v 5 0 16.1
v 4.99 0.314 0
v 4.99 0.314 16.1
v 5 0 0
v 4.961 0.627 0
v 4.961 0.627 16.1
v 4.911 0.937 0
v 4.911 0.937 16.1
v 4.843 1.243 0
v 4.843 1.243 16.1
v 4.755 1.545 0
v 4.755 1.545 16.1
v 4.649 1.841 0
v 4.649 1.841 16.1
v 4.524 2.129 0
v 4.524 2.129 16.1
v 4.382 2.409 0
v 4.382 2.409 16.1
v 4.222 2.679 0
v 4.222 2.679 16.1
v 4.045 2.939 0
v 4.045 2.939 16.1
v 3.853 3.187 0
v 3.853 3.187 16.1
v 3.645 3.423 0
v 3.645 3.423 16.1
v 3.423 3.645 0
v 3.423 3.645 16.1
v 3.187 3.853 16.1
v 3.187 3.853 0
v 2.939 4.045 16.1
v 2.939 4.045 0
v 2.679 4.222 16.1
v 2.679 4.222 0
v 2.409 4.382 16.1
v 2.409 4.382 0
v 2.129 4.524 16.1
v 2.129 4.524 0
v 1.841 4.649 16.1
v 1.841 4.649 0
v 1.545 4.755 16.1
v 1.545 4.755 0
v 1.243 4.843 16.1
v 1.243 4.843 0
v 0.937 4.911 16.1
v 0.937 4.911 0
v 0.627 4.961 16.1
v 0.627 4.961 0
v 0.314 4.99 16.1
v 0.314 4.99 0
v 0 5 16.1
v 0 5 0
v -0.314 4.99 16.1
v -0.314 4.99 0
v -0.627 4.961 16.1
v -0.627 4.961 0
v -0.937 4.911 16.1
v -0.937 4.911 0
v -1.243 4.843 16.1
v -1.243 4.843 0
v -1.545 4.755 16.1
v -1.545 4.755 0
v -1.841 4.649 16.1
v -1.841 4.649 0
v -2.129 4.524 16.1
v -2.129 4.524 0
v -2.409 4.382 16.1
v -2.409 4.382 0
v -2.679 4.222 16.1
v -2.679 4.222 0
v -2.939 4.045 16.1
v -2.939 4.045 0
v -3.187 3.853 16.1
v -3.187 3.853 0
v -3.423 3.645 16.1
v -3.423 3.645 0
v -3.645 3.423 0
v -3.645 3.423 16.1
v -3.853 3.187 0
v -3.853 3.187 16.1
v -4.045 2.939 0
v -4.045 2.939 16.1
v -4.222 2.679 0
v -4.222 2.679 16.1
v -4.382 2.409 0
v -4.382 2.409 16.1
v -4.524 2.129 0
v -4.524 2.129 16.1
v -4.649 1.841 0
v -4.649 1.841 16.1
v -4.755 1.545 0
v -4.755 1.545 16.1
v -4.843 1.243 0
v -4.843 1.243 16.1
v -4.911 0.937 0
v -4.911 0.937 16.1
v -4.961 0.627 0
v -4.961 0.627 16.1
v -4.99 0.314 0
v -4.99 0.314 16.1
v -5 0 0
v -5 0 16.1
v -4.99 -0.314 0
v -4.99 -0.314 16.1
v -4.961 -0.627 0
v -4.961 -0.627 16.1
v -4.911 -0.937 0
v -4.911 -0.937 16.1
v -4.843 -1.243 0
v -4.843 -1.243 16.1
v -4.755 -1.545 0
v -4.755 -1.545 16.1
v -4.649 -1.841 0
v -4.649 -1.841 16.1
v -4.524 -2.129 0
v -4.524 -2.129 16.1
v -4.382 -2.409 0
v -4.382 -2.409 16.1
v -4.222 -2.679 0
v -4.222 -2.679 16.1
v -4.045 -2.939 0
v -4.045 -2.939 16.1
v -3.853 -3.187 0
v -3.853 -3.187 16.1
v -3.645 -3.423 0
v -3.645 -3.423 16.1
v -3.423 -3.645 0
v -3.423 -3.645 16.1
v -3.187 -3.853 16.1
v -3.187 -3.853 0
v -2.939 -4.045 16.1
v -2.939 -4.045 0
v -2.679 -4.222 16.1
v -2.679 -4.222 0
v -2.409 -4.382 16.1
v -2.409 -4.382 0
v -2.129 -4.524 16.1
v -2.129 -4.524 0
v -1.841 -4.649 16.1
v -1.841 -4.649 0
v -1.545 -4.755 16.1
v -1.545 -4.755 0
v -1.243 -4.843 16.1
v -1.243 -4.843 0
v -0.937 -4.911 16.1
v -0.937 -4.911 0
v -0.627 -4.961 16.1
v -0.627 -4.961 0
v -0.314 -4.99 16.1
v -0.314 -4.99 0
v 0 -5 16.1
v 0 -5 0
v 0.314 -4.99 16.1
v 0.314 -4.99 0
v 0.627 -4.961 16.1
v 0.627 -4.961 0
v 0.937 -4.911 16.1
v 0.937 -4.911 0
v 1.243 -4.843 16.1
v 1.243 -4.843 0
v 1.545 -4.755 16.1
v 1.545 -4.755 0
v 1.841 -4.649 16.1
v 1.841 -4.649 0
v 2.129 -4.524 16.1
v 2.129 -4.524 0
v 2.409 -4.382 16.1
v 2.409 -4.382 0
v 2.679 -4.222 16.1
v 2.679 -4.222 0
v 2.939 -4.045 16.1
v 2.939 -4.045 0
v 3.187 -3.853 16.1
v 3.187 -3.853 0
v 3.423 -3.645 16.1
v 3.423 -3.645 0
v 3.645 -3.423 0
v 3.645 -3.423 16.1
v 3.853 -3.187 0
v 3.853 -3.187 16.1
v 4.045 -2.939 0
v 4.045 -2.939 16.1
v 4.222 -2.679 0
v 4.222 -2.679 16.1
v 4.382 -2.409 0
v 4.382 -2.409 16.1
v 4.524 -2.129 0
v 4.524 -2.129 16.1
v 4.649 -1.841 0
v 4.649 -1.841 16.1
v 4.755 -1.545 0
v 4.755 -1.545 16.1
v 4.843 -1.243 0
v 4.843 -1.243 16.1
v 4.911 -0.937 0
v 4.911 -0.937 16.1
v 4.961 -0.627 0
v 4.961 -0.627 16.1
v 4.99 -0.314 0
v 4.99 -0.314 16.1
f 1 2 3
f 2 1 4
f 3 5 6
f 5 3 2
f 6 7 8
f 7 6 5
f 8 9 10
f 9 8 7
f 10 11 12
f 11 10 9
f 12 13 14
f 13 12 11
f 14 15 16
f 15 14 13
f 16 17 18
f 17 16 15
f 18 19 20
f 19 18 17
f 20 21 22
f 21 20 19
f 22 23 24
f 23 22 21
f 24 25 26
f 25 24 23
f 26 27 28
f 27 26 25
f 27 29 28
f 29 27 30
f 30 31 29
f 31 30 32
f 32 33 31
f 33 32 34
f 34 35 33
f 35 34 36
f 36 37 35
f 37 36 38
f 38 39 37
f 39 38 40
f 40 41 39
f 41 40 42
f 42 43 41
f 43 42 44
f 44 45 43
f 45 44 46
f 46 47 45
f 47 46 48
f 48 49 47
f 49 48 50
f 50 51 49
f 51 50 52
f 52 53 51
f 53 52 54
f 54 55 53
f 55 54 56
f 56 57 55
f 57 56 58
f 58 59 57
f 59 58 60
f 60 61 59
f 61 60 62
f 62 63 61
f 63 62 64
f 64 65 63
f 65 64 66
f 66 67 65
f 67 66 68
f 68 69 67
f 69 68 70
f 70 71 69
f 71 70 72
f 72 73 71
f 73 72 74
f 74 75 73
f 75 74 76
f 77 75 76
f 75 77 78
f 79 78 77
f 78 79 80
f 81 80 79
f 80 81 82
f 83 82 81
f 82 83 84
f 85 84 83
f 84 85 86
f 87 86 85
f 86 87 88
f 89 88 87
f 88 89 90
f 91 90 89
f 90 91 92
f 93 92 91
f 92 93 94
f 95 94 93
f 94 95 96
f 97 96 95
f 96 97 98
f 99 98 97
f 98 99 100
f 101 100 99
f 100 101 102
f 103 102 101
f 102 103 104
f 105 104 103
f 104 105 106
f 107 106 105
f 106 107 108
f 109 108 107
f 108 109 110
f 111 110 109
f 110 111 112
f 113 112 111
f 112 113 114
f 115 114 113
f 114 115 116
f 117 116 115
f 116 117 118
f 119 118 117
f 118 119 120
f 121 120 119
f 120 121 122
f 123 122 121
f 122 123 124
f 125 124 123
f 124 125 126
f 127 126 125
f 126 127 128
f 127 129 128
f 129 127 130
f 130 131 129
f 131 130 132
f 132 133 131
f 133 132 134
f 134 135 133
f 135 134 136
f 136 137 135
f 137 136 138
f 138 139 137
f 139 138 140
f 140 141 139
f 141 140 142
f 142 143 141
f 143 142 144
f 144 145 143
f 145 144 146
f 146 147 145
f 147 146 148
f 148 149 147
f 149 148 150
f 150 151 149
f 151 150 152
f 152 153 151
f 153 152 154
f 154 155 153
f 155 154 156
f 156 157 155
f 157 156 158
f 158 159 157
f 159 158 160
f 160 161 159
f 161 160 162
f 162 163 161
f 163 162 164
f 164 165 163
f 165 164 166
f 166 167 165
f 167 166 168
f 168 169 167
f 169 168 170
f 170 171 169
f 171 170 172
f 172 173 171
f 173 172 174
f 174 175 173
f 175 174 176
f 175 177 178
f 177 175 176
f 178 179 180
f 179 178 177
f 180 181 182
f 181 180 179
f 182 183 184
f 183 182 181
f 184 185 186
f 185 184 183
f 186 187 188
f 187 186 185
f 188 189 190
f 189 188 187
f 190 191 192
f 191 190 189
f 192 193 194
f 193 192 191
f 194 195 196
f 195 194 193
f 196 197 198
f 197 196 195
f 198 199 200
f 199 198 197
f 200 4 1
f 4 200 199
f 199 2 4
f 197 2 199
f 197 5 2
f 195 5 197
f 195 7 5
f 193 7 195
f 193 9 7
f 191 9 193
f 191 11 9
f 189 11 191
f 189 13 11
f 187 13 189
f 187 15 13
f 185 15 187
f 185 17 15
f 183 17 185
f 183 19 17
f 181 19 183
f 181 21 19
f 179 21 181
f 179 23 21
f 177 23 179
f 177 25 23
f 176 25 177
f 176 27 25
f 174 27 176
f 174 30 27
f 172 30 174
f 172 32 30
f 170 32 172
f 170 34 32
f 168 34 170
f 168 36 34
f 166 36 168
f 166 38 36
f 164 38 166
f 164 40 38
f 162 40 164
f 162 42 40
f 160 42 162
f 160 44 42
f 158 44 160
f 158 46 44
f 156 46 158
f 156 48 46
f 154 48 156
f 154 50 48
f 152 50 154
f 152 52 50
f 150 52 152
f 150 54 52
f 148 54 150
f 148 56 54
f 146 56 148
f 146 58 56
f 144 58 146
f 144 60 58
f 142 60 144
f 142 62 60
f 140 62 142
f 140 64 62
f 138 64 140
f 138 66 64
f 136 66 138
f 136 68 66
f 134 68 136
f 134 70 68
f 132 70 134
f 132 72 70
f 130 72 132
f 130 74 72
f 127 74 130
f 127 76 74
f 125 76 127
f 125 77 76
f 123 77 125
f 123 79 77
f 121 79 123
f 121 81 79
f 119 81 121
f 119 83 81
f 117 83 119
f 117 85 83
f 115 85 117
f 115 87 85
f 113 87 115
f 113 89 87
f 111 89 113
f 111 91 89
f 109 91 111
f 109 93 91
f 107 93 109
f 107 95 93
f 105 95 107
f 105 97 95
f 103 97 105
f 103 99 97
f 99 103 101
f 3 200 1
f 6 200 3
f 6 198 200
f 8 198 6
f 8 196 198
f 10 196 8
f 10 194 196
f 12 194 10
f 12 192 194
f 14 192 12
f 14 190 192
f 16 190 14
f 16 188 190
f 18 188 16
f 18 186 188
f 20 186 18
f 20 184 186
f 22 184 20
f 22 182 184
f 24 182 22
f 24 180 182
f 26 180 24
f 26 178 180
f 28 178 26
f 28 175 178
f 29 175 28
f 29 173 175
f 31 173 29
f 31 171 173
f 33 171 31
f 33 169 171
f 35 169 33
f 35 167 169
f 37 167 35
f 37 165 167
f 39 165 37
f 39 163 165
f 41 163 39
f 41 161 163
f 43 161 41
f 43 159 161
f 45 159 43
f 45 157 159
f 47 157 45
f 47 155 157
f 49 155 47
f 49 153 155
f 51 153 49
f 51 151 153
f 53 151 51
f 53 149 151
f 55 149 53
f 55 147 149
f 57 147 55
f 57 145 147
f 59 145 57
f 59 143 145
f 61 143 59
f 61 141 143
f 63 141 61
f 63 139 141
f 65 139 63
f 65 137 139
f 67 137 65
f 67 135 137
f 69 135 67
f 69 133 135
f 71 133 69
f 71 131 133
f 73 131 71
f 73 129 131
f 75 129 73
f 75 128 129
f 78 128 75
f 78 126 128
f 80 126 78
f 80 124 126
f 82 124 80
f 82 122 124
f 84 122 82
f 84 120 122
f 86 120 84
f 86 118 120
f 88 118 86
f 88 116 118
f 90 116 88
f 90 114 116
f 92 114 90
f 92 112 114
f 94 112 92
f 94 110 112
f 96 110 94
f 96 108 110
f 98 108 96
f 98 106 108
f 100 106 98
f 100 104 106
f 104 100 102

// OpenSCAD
// file: rivnut-m3.scad
rivnut_m3_insert_r = 5.1/2;
rivnut_m3_insert_h = 9;
rivnut_m3_insert_hat_r = 8.1/2;
rivnut_m3_insert_hat_h = 1;

module rivnut_m3(
    insert_r = rivnut_m3_insert_r,
    insert_h = rivnut_m3_insert_h,
    insert_hat_r = rivnut_m3_insert_hat_r,
    insert_hat_h = rivnut_m3_insert_hat_h,
) {
    $fn = 80;
    translate([0,0,insert_h])
    scale([1,1,-1]) {
        cylinder(h=insert_h - 1, r=insert_r);
        translate([0,0,insert_h-1])
            cylinder(h=1, r1=insert_r, r2 = insert_r-1);
        cylinder(h=insert_hat_h, r=insert_hat_r);
    }
}

//rivnut_m3();
// main file
include <rivnut-m3.scad>

screw_holder_height = 16.1;
screw_holder_radius = 5;

module screw_holder(
    h=screw_holder_height,
    r=screw_holder_radius,
) {
    $fn=100;
    cylinder(h=h,r=r);
}

screw_holder();
